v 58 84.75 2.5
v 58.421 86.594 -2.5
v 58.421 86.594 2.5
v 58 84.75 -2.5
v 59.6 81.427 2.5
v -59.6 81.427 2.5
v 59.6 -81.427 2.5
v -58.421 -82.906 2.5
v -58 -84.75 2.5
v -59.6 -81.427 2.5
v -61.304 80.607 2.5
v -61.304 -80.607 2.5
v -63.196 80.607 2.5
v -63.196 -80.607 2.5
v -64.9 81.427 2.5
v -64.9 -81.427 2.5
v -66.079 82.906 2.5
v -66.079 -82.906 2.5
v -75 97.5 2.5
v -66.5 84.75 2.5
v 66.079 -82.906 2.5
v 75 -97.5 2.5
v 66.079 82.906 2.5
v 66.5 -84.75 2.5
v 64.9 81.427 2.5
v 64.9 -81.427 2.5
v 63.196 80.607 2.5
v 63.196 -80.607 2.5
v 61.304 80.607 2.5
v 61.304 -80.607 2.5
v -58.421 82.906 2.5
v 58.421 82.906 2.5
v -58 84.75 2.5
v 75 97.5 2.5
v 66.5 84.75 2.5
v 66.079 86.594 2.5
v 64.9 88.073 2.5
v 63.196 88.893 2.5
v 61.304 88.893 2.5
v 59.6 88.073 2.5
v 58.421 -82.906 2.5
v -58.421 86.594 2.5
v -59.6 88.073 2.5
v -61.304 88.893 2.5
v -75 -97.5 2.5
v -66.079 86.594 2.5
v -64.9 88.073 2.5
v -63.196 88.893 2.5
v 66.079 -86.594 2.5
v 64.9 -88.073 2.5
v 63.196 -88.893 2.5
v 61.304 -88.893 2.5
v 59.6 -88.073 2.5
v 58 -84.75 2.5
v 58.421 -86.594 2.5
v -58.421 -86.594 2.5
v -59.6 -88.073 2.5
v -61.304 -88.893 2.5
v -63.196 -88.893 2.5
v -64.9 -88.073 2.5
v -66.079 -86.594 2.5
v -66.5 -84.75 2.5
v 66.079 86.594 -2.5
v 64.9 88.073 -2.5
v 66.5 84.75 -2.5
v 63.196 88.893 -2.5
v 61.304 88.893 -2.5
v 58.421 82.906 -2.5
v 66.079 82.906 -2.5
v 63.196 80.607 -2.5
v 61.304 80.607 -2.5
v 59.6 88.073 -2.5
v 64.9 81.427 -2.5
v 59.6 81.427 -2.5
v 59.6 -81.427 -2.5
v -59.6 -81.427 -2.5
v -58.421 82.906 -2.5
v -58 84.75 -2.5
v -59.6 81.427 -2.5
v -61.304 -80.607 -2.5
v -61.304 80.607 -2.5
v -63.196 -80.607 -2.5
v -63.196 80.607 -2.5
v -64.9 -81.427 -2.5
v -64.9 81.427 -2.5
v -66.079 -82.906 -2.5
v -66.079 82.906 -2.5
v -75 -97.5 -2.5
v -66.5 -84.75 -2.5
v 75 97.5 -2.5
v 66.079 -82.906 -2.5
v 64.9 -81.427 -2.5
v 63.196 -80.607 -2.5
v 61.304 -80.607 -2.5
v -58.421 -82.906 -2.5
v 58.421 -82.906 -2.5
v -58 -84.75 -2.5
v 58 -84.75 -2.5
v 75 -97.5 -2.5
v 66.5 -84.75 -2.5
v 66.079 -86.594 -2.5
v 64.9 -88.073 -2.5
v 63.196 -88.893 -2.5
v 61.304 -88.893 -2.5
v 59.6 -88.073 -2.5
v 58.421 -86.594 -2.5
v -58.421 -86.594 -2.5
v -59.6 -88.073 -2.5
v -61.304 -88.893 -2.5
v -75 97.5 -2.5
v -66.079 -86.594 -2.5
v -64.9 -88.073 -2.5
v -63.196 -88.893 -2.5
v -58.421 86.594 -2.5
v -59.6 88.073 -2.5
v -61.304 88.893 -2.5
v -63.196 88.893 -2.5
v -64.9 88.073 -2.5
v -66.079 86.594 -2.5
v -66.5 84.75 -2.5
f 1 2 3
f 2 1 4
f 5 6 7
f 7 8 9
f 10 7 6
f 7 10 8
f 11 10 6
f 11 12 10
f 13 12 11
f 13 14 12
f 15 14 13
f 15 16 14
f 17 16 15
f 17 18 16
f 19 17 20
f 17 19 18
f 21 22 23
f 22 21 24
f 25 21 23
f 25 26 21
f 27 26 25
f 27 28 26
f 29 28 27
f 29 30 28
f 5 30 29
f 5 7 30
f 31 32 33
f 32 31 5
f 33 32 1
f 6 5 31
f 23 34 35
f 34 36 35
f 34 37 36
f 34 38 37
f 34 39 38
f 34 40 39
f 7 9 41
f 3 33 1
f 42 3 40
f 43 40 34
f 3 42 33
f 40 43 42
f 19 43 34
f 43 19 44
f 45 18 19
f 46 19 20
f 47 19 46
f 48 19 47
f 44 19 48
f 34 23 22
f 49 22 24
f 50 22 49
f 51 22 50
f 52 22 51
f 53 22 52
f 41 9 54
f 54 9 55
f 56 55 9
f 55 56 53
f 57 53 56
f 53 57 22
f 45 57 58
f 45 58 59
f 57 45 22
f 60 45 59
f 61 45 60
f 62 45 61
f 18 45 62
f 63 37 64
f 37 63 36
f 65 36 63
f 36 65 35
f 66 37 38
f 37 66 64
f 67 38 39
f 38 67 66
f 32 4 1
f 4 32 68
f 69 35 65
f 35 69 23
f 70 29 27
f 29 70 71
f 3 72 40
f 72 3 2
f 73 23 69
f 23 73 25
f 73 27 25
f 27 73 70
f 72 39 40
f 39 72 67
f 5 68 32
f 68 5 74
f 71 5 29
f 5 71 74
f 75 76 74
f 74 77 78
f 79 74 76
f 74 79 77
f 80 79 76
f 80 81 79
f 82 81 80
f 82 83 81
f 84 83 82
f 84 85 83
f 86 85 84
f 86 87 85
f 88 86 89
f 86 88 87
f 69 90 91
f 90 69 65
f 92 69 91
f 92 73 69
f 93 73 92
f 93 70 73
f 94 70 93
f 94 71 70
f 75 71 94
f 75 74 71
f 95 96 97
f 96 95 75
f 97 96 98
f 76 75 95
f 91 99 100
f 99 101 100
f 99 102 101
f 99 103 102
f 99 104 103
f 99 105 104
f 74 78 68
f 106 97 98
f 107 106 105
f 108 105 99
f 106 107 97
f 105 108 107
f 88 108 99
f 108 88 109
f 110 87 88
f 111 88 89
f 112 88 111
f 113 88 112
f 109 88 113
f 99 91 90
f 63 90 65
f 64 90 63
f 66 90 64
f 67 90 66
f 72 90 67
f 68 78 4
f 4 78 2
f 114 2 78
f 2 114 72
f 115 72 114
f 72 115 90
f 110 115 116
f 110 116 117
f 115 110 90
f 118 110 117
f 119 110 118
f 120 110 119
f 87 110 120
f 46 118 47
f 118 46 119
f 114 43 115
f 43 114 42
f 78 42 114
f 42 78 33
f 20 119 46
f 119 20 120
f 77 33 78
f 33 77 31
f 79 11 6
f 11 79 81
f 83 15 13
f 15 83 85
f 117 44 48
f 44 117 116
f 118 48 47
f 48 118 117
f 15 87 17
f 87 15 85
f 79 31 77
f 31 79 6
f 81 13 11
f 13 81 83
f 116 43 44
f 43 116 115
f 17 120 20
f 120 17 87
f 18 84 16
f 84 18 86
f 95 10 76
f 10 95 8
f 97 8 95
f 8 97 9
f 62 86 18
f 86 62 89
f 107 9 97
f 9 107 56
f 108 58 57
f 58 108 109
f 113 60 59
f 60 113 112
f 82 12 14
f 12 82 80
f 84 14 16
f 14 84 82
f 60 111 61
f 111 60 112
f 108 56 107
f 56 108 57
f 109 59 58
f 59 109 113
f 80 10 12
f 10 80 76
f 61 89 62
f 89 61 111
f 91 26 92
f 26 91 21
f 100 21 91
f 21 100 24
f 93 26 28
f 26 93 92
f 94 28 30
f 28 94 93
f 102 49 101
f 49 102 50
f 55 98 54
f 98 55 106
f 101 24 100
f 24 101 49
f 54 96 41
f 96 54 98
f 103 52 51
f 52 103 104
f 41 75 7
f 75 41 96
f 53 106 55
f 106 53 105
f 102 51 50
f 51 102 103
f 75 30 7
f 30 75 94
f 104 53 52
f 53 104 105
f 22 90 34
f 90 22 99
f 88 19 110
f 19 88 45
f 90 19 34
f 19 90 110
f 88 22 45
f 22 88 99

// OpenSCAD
// Generated by SolidPython 1.1.3 on 2023-10-16 11:53:18


difference() {
	cube(center = true, size = [150, 195.0000000000, 5]);
	union() {
		translate(v = [62.2500000000, 84.7500000000]) {
			cylinder(center = true, h = 5, r = 4.2500000000);
		}
		translate(v = [-62.2500000000, 84.7500000000]) {
			cylinder(center = true, h = 5, r = 4.2500000000);
		}
		translate(v = [-62.2500000000, -84.7500000000]) {
			cylinder(center = true, h = 5, r = 4.2500000000);
		}
		translate(v = [62.2500000000, -84.7500000000]) {
			cylinder(center = true, h = 5, r = 4.2500000000);
		}
	}
}
/***********************************************
*********      SolidPython code:      **********
************************************************
 
import solid
import numbers
import pudb
from solid.utils import *
import viewscad
import subprocess
import os
import os.path as osp
import math
import sys

chamfer_extrude=solid.import_scad("./chamfer_extrude.scad")
chamfer_extrude=chamfer_extrude.chamfer_extrude
r = viewscad.Renderer(width=800, height=800)

def debug(model,f_name,path="/home/ts/code/projects/mfd/designs/debug"):
    solid.scad_render_to_file(model,osp.join(path,f_name)+".scad")
#generate position list of wells using offset from center
wells_pos_from_center_4 = lambda offset: [[-offset,offset],
                                        [offset, offset],
                                        [-offset, -offset],
                                        [offset, -offset]]
#wells_pos_from_center_2 = lambda offset: [[0,offset],
#                                        [0, -offset]]
wells_pos_from_center_2 = lambda offset: [[offset,0],
                                        [-offset,0]]

def make_well(dims,shape=None,height=None,dxf=False):
    def circle_cylinder():
        if dxf or (height is None):
            well = solid.circle(r=dims, segments=64)
        else:
            well = solid.cylinder(r=dims, h=height, segments=64, center = True)
        return well
    if dims is None:
        sys.exit("radius needs to be a number")
    if isinstance(dims, numbers.Number):
        well =circle_cylinder()
    elif len(dims)==1:
        if isinstance(dims[1], numbers.Number):
            well =circle_cylinder()
        else:
            sys.exit("radius needs to be a number")
    elif len(dims)==2:
        well = solid.square(dims,center = True)
    elif len(dims)==3:
        well = solid.cube(dims, center = True)
    return well

def wells_top_bottom(center_gap,device_dims=None,shape=None,height=None, positions = None, dxf = False):
    well_shape = make_well(device_dims,shape=shape,height=height,dxf=dxf)
    wells = []
    if positions is None:
        offset = radius+radius/2.0
        positions = wells_pos_from_center_2(offset)
    if dxf or (height is None):
        height = 0
    for position in positions:
        if dxf:
            wells.append(solid.translate([position[0],position[1]])(well_shape))
        else:
            wells.append(solid.translate([position[0],position[1],height/2.0])(well_shape))
    return  union()(*wells)

#place wells in four corners 
def four_corner(radius,height=None, positions = None, dxf = False):
    #if well pos not specified set
    #to equally spaced by half radius
    if positions is None:
        offset = radius+radius/2.0
        positions = wells_pos_from_center_4(offset)
    if dxf or (height is None):
        height = 0
    #make wells at positions with specified radius and height
    wells = []
    for position in positions:
        #make circle if making dxf
        if dxf:
            well_shape = solid.circle(r=radius, segments=64)
            well_shape = solid.translate([position[0],position[1]])(well_shape)
        #if stl make cylinder
        else:
            well_shape = solid.cylinder(r=radius, h=height, segments=64, center = True)
            well_shape = solid.translate([position[0],position[1],height/2.0])(well_shape)
        wells.append(well_shape)
    return  union()(*wells)

#generate channels 
def make_channels(length,width,height=0,num_chans=1,max_chans=None,spacing=None, dxf = False,
                  rotate_channels=False):
    if dxf or (height is None):
        height = 0
    #if channel gap not defined, is equal to
    if spacing is None: spacing = width
    #calculate number of channels if fitting max num within given width
    if not max_chans is None:
        import math
        num_chans = math.floor((max_chans-spacing)/(width+spacing))
    #get total width of channel section  
    total_width = (width*num_chans)+(spacing*(num_chans-1))

    #make template channel
    #if rotate_channels: width, length = length, width
    if dxf:
        channel_t = solid.square([length,width],center = True)
    else:
        channel_t = solid.cube([length,width,height], center = True)

    #if number channels is even, offset the first channel to center its gap
    if num_chans % 2 == 0: centering = -(width/2.0+spacing/2.0)
    else: centering = 0
    #move template channel up to align bottom at z = 0 
    #and offset center if necessary
    if dxf:
        channel_t = solid.translate([0,centering])(channel_t)
    else:
        channel_t = solid.translate([0,centering,height/2.0])(channel_t)

    #if rotate_channels: length,width = width,length
    #start making the channels
    channels = []
    for i in range(num_chans):
        #if i=0 there is no translation
        #if i=1, we make the first channel adjacent to second
        direction = i

        #if i>=1, we add channels alternating left and right
        if i >= 1:
            direction = -(i/2.0)
            if i % 2 == 1: direction = (-direction)+0.5
                
        #make channel at right position and add it to channel list
        translation_coords = [0,direction*(width+spacing)]
        #if rotate_channels: translation_coords = [direction*(width+spacing),0]
        if dxf:
            channel = solid.translate(translation_coords)(channel_t)
        else:
            channel = solid.translate([*translation_coords,0])(channel_t)
        channels.append(channel)
    
    #group all channels as one object
    channels = union()(*channels)
    #compute the x,y,z dimensions in order to pass as arguments 
    #for construction of other parts of device (such as the chambers)
    measurements = {'x':(length/2.0,-length/2.0),
                    'y':(total_width/2.0,-total_width/2.0)}
    if not dxf:
        measurements['z'] = (height,0)
    if rotate_channels:
        channels = solid.rotate(90)(channels)
        measurements['x'],measurements['y']=measurements['y'],measurements['x']
    return channels,measurements

def make_chambers(msrs,height=None,extra=0,len_until=None,width=None, dxf = False):
    #computes x,y,z length
    total = lambda x : abs(x[0]) + abs(x[1])
    
    #if specific height if specified
    #otherwise use same height as channels
    if dxf:
        pass
    elif not height is None:
        msrs['z'] = (height,0)
    else:
        msrs['z'] = (0,0)
        
    #make copy of measurements from channels to modify chamber dimensions 
    #and add length to chambers as specified
    chamber_dims = msrs.copy()
    #calculate length of chamber to reach specified offset
    if not len_until is None:
        chamber_len = len_until-(msrs['x'][0])
    #or add specified length to channel length (if not specified, adds 0)
    else:
        chamber_len = msrs['x'][0]+extra
    #set the chamber length based 
    chamber_dims['x'] = (chamber_len/2.0,-(chamber_len/2.0))
    #compute final dimensions of chamber
    if not width is None:
        chamber_dims['y'] = (width/2.0,-width/2.0)
    chamber_dims = [total(size) for size in chamber_dims.values()]
        
    #calculate chamber translation offset to place adjacent to channels
    chamber_trslt = msrs['x'][0]+(chamber_len/2.0)
    #compute chamber translation coordinates to align with channels
    #x = 1 moves chamber above channels
    #x = -1 moves chamber below channels
    if dxf:
        trslt = lambda x : [x*(chamber_trslt),0]
    else:
        trslt = lambda x : [x*(chamber_trslt),0,msrs['z'][0]/2.0]
    
    #function to make chamber at top or at bottom 
    if dxf:
        move = lambda x : solid.translate(trslt(x))(solid.square(chamber_dims, center = True) )
    else:
        move = lambda x : solid.translate(trslt(x))(solid.cube(chamber_dims,center = True))
    #make top and bottom chambers and return them as grouped
    top = move(1)
    bottom = move(-1)
    #chambers=solid.rotate(90)(solid.union()(top,bottom))
    chambers=(solid.union()(top,bottom))

    return chambers

#create alignment features 
def alignment_features(unit,dims,grid_size, mask_size = None, alignment = "hollow", units_from_center = (2.5,2.5), corner_len=None):
    width = grid_size[0]*dims[0]
    length = grid_size[1]*dims[1]
    if mask_size is None and corner_len is None:
        corner_len = (dims[0] + dims[1]) /2 / 8
    corner = lambda thickness_div : solid.union()( solid.square([corner_len,corner_len/thickness_div],center=False), solid.square([corner_len/thickness_div,corner_len],center=False) )
    
    def make_full(thickness_div):
        thickness = corner_len/thickness_div
        tr = solid.translate([0, 0, 0 ])(solid.rotate(180)(corner(thickness_div)))
        tr = solid.translate([thickness/2,thickness/2,0])(tr)
        bl = solid.translate([0, 0, 0 ])(solid.rotate(0)(corner(thickness_div)))
        bl = solid.translate([-thickness/2,-thickness/2,0])(bl)
        return solid.union()(tr,bl)
    
    def make_hollow(thickness_div):
        thickness = corner_len/(thickness_div/2)
        inner = make_full(thickness_div)
        outer = make_full(thickness_div/2)
        hollow = outer - inner 
        return hollow
    
    center = (width /2 , length/2)
    mask_pos = lambda x,y : (center[0] + x*(float(units_from_center[0])*dims[0]), center[1] + y*(float(units_from_center[1])*dims[1]))
    positions = []
    positions.append(mask_pos(1,0))
    positions.append(mask_pos(0,1))
    positions.append(mask_pos(-1,0))
    positions.append(mask_pos(0,-1))
    make_mask = lambda mtype : make_hollow(8) if mtype == "hollow" else make_full(8)
    masks = [ solid.translate([*position,0])(make_mask(alignment)) for position in positions]
    
    solid.scad_render_to_file(solid.union()(*masks),"./designs/open_chamber/masks.scad")
    #return unit - solid.union()(*masks)
    return solid.union()(*masks,unit)

def create_outline(thickness, array, dims, grid_size,):
    width = grid_size[0]*dims[0] + thickness *2
    length = grid_size[1]*dims[1] + thickness *2
    outer = solid.translate([-thickness, -thickness,0])(solid.square([width, length]))
    return outer-array

def create_wall(wall_thickness, outline_thickness, dims, grid_size, wall_height = 2000, dxf = False):
    inner_width = grid_size[0]*dims[0] + outline_thickness *2
    inner_length = grid_size[1]*dims[1] + outline_thickness *2
    outer_width = inner_width + wall_thickness * 2
    outer_length = inner_length + wall_thickness * 2
    outer_pos_x = -outline_thickness-wall_thickness
    outer_pos_y = -outline_thickness-wall_thickness
    inner_pos_x = -outline_thickness
    inner_pos_y = -outline_thickness
    if dxf:
        inner_wall = solid.translate([inner_pos_x,
                                      inner_pos_y,
                                      0])(solid.square([inner_width, inner_length]))
        outer_wall = solid.translate([outer_pos_x,
                                      outer_pos_y,
                                      0])(solid.square([outer_width, outer_length]))

        return outer_wall-inner_wall
    else:
        inner_wall = solid.translate([inner_pos_x,
                                      inner_pos_y,
                                      0])(solid.cube([inner_width, inner_length,wall_height]))
        outer_wall = solid.translate([outer_pos_x,
                                      outer_pos_y,
                                      0])(solid.cube([outer_width, outer_length,wall_height]))

        return outer_wall-inner_wall, {'wall_height': wall_height,
                                       'wall_thickness': wall_thickness,
                                       'inner_width':inner_width,
                                       'inner_length': inner_length,
                                       'outer_width': outer_width,
                                       'outer_length': outer_length,
                                       'outer_pos_x' : outer_pos_x,
                                       'outer_pos_y' : outer_pos_y,
                                       'inner_pos_x' : inner_pos_x,
                                       'inner_pos_y' : inner_pos_y}

def create_thicker_wall(wall_thickness, outer_wall_offset, wall_dims, dims, grid_size, height_start = .2, height_end=2, dxf = False):
    addon_wall,thicker_wall_dims = create_wall(wall_thickness, outer_wall_offset, dims, grid_size, wall_height=height_end-height_start, dxf = False)
    addon_wall = solid.translate([0,0,height_start])(addon_wall)

    thicker_wall_dims['wall_height'] = height_end
    thicker_wall_dims['wall_thickness'] = wall_dims['wall_thickness'] + wall_thickness
    return addon_wall, thicker_wall_dims
 
def add_lock_to_wall(wall,wall_dims,y_offset = 0,cut_ratio=0.7,L_length=3, gap_ratio=0.05, axis="x",width_ratio=1/2):
    # Makes L shape
    def make_L(max_length,length_thickness,max_width,width_thickness,height,y_offset):
        length = solid.cube([max_length,length_thickness,height])
        width = solid.cube([width_thickness,max_width,height])
        width = solid.translate([max_length-(width_thickness),0,0])(width)
        L = solid.union()(width,length)
        debug(L,"L")
        if axis == "x":
            L = solid.rotate(-90)(L)
            L = solid.translate([0,max_length,0])(L)
        else:
            L = solid.rotate(-180)(L)
            L = solid.translate([max_length,max_width,0])(L)
        return solid.translate([0,0,y_offset])(L)
    
    lock_length = L_length
    lock_width = wall_dims['wall_thickness']*width_ratio
    lock_length_thickness = lock_width/2
    lock_width_thickness = lock_width/2
    L_lock = make_L(lock_length,lock_length_thickness,lock_width,lock_width_thickness, wall_dims['wall_height']-y_offset, y_offset)
    
    margin_space = lock_length - lock_length*(1-gap_ratio)
    key_length = lock_length-margin_space
    key_length_thickness = lock_length_thickness-(margin_space*2)
    key_width = lock_width-(margin_space*2)
    key_width_thickness = lock_width_thickness-(margin_space*2)
    L_key = make_L(key_length,key_length_thickness,key_width,key_width_thickness, wall_dims['wall_height']-y_offset, y_offset)
    L_key = solid.translate([margin_space,margin_space,0])(L_key)
    L = solid.union()(L_lock,L_key)
    debug(L,"L")
    
    #Make cube to be used as negative to split frame in a half
    #Can choose if making left or right negative, specify ratio of split
    def make_negative(right,cut_ratio):
        if axis == "x":
            if right:
                length = wall_dims['outer_length']*(1-cut_ratio)
                pos_x = wall_dims['outer_pos_x']+(wall_dims['outer_length']*cut_ratio)
            else:
                length = wall_dims['outer_length']*(cut_ratio)
                pos_x = wall_dims['outer_pos_x'] 
            negative = solid.cube([wall_dims['outer_width'],length, wall_dims['wall_height']])
            negative = solid.translate([wall_dims['outer_pos_y'],pos_x,0])(negative)
        else:
            if right:
                length = wall_dims['outer_width']*(1-cut_ratio)
                pos_x = wall_dims['outer_pos_y']+(wall_dims['outer_width']*cut_ratio)
            else:
                length = wall_dims['outer_width']*(cut_ratio)
                pos_x = wall_dims['outer_pos_y'] 
            negative = solid.cube([length,wall_dims['outer_length'], wall_dims['wall_height']])
            negative = solid.translate([pos_x,wall_dims['outer_pos_x'],0])(negative)
        return negative, pos_x, length 
                      
    #Make negatives
    negative_right, right_half_pos_x, right_half_length = make_negative(True,cut_ratio)
    negative_left, left_half_pos_x, right_half_length = make_negative(False,cut_ratio)
    #Make halves
    left_half = solid.difference()(wall,negative_right)
    right_half = solid.difference()(wall,negative_left)
    def place_L(L, L_length,L_width):
        #Place L on top wall       
        offset_to_center = (wall_dims['wall_thickness']-L_width)/2
        if axis == "x":
            y_pos_top = (wall_dims['outer_pos_y'] +
                    wall_dims['outer_width'] - 
                    L_width - offset_to_center)
            top_L = solid.translate([y_pos_top,
                                     right_half_pos_x-(L_length),
                                     0])(L)
            #Place L on bottom wall       
            y_pos_bottom = wall_dims['outer_pos_y']+offset_to_center
            bottom_L = solid.translate([y_pos_bottom,
                                        right_half_pos_x-L_length,
                                        0])(L)
        else:
            y_pos_top = (wall_dims['outer_pos_x'] +
                    wall_dims['outer_length'] -
                    (L_width+offset_to_center))
            top_L = solid.translate([right_half_pos_x-L_length,
                                     y_pos_top,
                                     0])(L)
            #Place L on bottom wall       
            y_pos_bottom = wall_dims['outer_pos_y']+offset_to_center
            bottom_L = solid.translate([right_half_pos_x-L_length,
                                        y_pos_bottom,
                                        0])(L)
        return bottom_L, top_L
    #Make complimentary L pieces through union and differences
    #Make Lock
    bottom_L_lock, top_L_lock = place_L(L_lock,L_length,lock_width)
    left_half = solid.difference()(left_half,bottom_L_lock)
    left_half = solid.difference()(left_half,top_L_lock)
    #Make Key
    bottom_L_key, top_L_key = place_L(L_key,L_length,lock_width)
    right_half = solid.union()(right_half,bottom_L_key)
    right_half = solid.union()(right_half,top_L_key)
    return left_half, right_half


#build a row x col grid of containment units
def make_unit_array(unit,dims,grid_size, dxf = False, alignment = None, mask_size = None,
                    units_from_center = None,alignment_offset=None, alignment_mark_size=1):
    units = []
    for col in range(grid_size[1]):
        for row in range(grid_size[0]):
            if dxf:
                units.append(solid.translate([row*dims[0],col*dims[1]])(unit))
            else:
                units.append(solid.translate([row*dims[0],col*dims[1],dims[2]/2.0])(unit))
    array = solid.union()(*units)
    if (not alignment is None) and dxf:
        if not alignment_offset is None:
            array = solid.translate([alignment_offset[0],alignment_offset[1]])(array)
        array = alignment_features(array,dims, grid_size, alignment = alignment, mask_size = None, units_from_center = units_from_center,corner_len=alignment_mark_size)
        if not alignment_offset is None:
            array = solid.translate([-alignment_offset[0],-alignment_offset[1]])(array)
    return array


def make_taylor(wells_pos = wells_pos_from_center_4(2.25), well_rad = 1.5 ,
                well_height = 2, chan_w = 0.01, chan_l = 1, chan_h = 0.010 ,
                chan_gap = 0.040, max_chans = None,num_chans=100, chamber_height  = 0.100,
                columns = 1, rows = 1, chamber_len_until=2.25, add_channels = True, add_wells = True, 
                add_chambers = True, save_path = "./", alignment = None, units_from_center = 2,
                mask_size = None, render_stl = False, outline_thickness = 0.050, dxf = True,
                wall_height = 15, wall_thickness = 0.95, casing_x=9, casing_y=9, casing_z=0,rotate_units=0):

    dims = [casing_x, casing_y, casing_z]
    wells = four_corner(well_rad,well_height, dxf = dxf, positions = wells_pos)
    debug(wells,"wells")
    channels, msrs = make_channels(chan_l,chan_w,chan_h,dxf=dxf, spacing = chan_gap, max_chans=max_chans,num_chans=num_chans)
    debug(channels,"channels")
    chambers = make_chambers(msrs,dxf = dxf, height=chamber_height,len_until=chamber_len_until)
    debug(chambers,"chambers")

    #add together and render
    device_parts = []
    if add_channels:
        device_parts.append(channels)
    if add_wells:
        device_parts.append(wells)
    if add_chambers:
        device_parts.append(chambers)
    device=union()(*device_parts)
    device = rotate(rotate_units)(device)

    device=solid.translate([dims[0]/2.0,dims[1]/2.0,0])(device)
    channels = rotate(rotate_units)(channels)
    channels=solid.translate([dims[0]/2,dims[1]/2,0])(channels)
    chambers_wells = union()(wells,chambers)
    chambers_wells = rotate(rotate_units)(chambers_wells)
    chambers_wells=solid.translate([dims[0]/2,dims[1]/2,0])(chambers_wells)

    file_name = str(rows)+'x'+str(columns)+'_units_'
    grid_size = [rows,columns]

    if alignment:
        alignment="full"
    device = make_unit_array(device,dims,grid_size, dxf=dxf, alignment = alignment,
                                 units_from_center = units_from_center)
    channels = make_unit_array(channels,dims,grid_size, dxf=dxf, alignment = alignment,
                                 units_from_center = units_from_center)
    if alignment=="full":
        alignment="hollow"

    chambers_wells = make_unit_array(chambers_wells,dims,grid_size, dxf=dxf, alignment = alignment,
                                 units_from_center =units_from_center)

    def save_model(model,prefix):
        model_fname = os.path.abspath(save_path+prefix+"_"+file_name+".scad")
        solid.scad_render_to_file(model,model_fname)
        return model_fname

    wells_fname = save_model(wells,"wells")
    channels_fname = save_model(channels,"channels")
    device_fname = save_model(device,"device")
    chambers_wells_fname = save_model(chambers_wells,"chambers_wells")
    return (chambers_wells,chambers_wells_fname), (channels,channels_fname), (device,device_fname)

def make_device(design='open',rows=8,columns=6,wells_pos = 4.5,well_offset=3.2, well_rad=3.2,well_height=0.1,
                chan_l=1,chan_w=0.01,chan_h=0.01,chan_gap=0.015,num_chans=101,dxf=True,save_path="./designs/open_chamber/",
                casing_x=9.0,casing_y=18.0,casing_z=0,rotate_units=90,units_from_center=(3,1),chamber_len_until=4.5,
                chamber_width=None,alignment=True, add_wells=True, add_channels=True,add_chambers=True):

    dims = [casing_x, casing_y, casing_z]
    if design == "open":
        wells_pos=wells_pos_from_center_2(wells_pos)
        wells = wells_top_bottom(well_offset*2,device_dims=well_rad,height=well_height, dxf = dxf, positions = wells_pos)
    elif design == "closed":
        wells_pos=wells_pos_from_center_4(wells_pos)
        debug(wells,"wells")
        wells = four_corner(well_offset,well_heightdevice_dims=well_rad, dxf = dxf, positions = wells_pos)
    else:
        print(design+" is not a valid design.\n Choose valid design: 'open' or 'closed'")
        exit()
    wells = rotate(rotate_units)(wells)
    wells=solid.translate([dims[0]/2,dims[1]/2,0])(wells)
    debug(wells,"wells")

    channels, msrs = make_channels(chan_l,chan_w,chan_h,dxf=dxf, spacing = chan_gap, num_chans=num_chans,rotate_channels=False)
    channels = rotate(rotate_units)(channels)
    channels=solid.translate([dims[0]/2,dims[1]/2,0])(channels)

    chambers=make_chambers(msrs,height=None,extra=0,len_until=chamber_len_until, width=chamber_width,dxf = dxf)
    chambers = rotate(rotate_units)(chambers)
    chambers=solid.translate([dims[0]/2,dims[1]/2,0])(chambers)

    device_parts = []
    if add_channels:
        device_parts.append(channels)
    if add_wells:
        device_parts.append(wells)
    if add_chambers:
        device_parts.append(chambers)
    device = union()(*device_parts)
    #device = rotate(rotate_units)(device)
    #device=solid.translate([dims[0]/2.0,dims[1]/2.0,0])(device)

    chambers_wells = []
    if add_chambers:
        chambers_wells.append(chambers)
    if add_wells:
        chambers_wells.append(wells)
    chambers_wells = union()(*chambers_wells)
    #chambers_wells = union()(wells,chambers)
    #chambers_wells = rotate(rotate_units)(chambers_wells)
    #chambers_wells=solid.translate([dims[0]/2,dims[1]/2,0])(chambers_wells)

    file_name = str(rows)+'x'+str(columns)+'_units_'

    grid_size = [rows,columns]
    if alignment:
        alignment="full"
    device = make_unit_array(device,dims,grid_size, dxf=dxf, alignment = alignment,
                                 units_from_center = units_from_center)
    channels = make_unit_array(channels,dims,grid_size, dxf=dxf, alignment = alignment,
                                 units_from_center = units_from_center)
    if alignment=="full":
        alignment="hollow"

    chambers_wells = make_unit_array(chambers_wells,dims,grid_size, dxf=dxf, alignment = alignment,
                                 units_from_center =units_from_center)

    def save_model(model,prefix):
        model_fname = os.path.abspath(save_path+prefix+"_"+file_name+".scad")
        solid.scad_render_to_file(model,model_fname)
        return model_fname

    wells_fname = save_model(wells,"wells")
    channels_fname = save_model(channels,"channels")
    device_fname = save_model(device,"device")
    chambers_wells_fname = save_model(chambers_wells,"chambers_wells")
    return (chambers_wells,chambers_wells_fname), (channels,channels_fname), (device,device_fname)


def make_open_chamber(rows=8,columns=6,wells_pos = wells_pos_from_center_2(4.5), well_rad=3.2,well_height=0.1,
                      chan_l=1,chan_w=0.01,chan_h=0.01,chan_gap=0.015,num_chans=101,dxf=True,save_path="./designs/open_chamber/",
                      casing_x=9.0,casing_y=18.0,casing_z=0,rotate_units=90,units_from_center=(3,1),chamber_len_until=4.5,
                      chamber_width=None,alignment=True, add_wells=True, add_channels=True,add_chambers=True):

    dims = [casing_x, casing_y, casing_z]
    wells = wells_top_bottom(well_rad,height=well_height, dxf = dxf, positions = wells_pos)
    channels, msrs = make_channels(chan_l,chan_w,chan_h,dxf=dxf, spacing = chan_gap, num_chans=num_chans,rotate_channels=False)
    chambers=make_chambers(msrs,height=None,extra=0,len_until=chamber_len_until, width=chamber_width,dxf = dxf)
    debug(chambers,"chambers")
    device_parts = []
    if add_channels:
        device_parts.append(channels)
    if add_wells:
        device_parts.append(wells)
    if add_chambers:
        device_parts.append(chambers)
    device = union()(*device_parts)
    device = rotate(rotate_units)(device)
    device=solid.translate([dims[0]/2.0,dims[1]/2.0,0])(device)
    channels = rotate(rotate_units)(channels)
    channels=solid.translate([dims[0]/2,dims[1]/2,0])(channels)
    chambers_wells = union()(wells,chambers)
    chambers_wells = rotate(rotate_units)(chambers_wells)
    chambers_wells=solid.translate([dims[0]/2,dims[1]/2,0])(chambers_wells)

    file_name = str(rows)+'x'+str(columns)+'_units_'

    grid_size = [rows,columns]
    if alignment:
        alignment="full"
    device = make_unit_array(device,dims,grid_size, dxf=dxf, alignment = alignment,
                                 units_from_center = units_from_center)
    channels = make_unit_array(channels,dims,grid_size, dxf=dxf, alignment = alignment,
                                 units_from_center = units_from_center)
    if alignment=="full":
        alignment="hollow"

    chambers_wells = make_unit_array(chambers_wells,dims,grid_size, dxf=dxf, alignment = alignment,
                                 units_from_center =units_from_center)

    def save_model(model,prefix):
        model_fname = os.path.abspath(save_path+prefix+"_"+file_name+".scad")
        solid.scad_render_to_file(model,model_fname)
        return model_fname

    wells_fname = save_model(wells,"wells")
    channels_fname = save_model(channels,"channels")
    device_fname = save_model(device,"device")
    chambers_wells_fname = save_model(chambers_wells,"chambers_wells")
    return (chambers_wells,chambers_wells_fname), (channels,channels_fname), (device,device_fname)

def to_dxf(scad_path):
    dxf_path = scad_path.replace(".scad",".dxf")
    subprocess.call(["openscad", "-o", dxf_path, scad_path])
    import ezdxf
    temp_dxf = ezdxf.readfile(dxf_path)
    temp_dxf.saveas(dxf_path)

#def make_walls(diameter,thickness,grid_size,dims,height=20,segments=256,make_inner=True):
#    wafer_wall_out = solid.cylinder(r=diameter/2,h=height, segments=segments)
#    wafer_wall_in = solid.cylinder(r=(diameter/2-thickness),h=height, segments=segments)
#    wafer_wall = solid.difference()(wafer_wall_out,wafer_wall_in)
#    wafer_wall = solid.translate([grid_size[1]*dims[1]/2.0,grid_size[0]*dims[0]/2.0])(wafer_wall)
#
#    vertical_wall_length = grid_size[1]*dims[1]
#    horizontal_wall_length = grid_size[0]*dims[0]
#    vertical_wall = solid.cube([vertical_wall_length,thickness,height],center = True)
#    vertical_wall = solid.translate([vertical_wall_length/2,0,height/2])(vertical_wall)
#    horizontal_wall = solid.cube([thickness,horizontal_wall_length,height],center = True)
#    horizontal_wall = solid.translate([0,vertical_wall_length/2,height/2])(horizontal_wall)
#    walls = []
#    walls.append(horizontal_wall)
#    walls.append(vertical_wall)
#    for col in range(grid_size[1]):
#        if col == grid_size[1]-1: 
#            walls.append(solid.translate([0,(col+1)*dims[1]])(vertical_wall))
#        elif col > 0 and col < grid_size[1]-1 and make_inner==True:
#            walls.append(solid.translate([0,(col+1)*dims[1]])(vertical_wall))
#    for row in range(grid_size[0]):
#        if row == grid_size[0]-1: 
#            walls.append(solid.translate([(row+1)*dims[0],0])(horizontal_wall))
#        elif row > 0 and row < grid_size[0]-1 and make_inner==True:
#            walls.append(solid.translate([(row+1)*dims[0],0])(horizontal_wall))
#    walls = union()(*walls)
#    wafer_walls = union()(walls,wafer_wall)
#    return walls,wafer_wall,wafer_walls

def make_walls(diameter,thickness,grid_size,dims,height=20,segments=256,make_inner=True,padx=0,pady=0):
    wafer_wall_out = solid.cylinder(r=diameter/2,h=height, segments=segments)
    wafer_wall_in = solid.cylinder(r=(diameter/2-thickness),h=height, segments=segments)
    wafer_wall = solid.difference()(wafer_wall_out,wafer_wall_in)
    wafer_wall = solid.translate([grid_size[1]*dims[1]/2.0,grid_size[0]*dims[0]/2.0])(wafer_wall)

    vertical_wall_length = grid_size[0]*dims[0]+padx
    horizontal_wall_length = grid_size[1]*dims[1]+pady
    vertical_wall = solid.cube([vertical_wall_length,thickness,height],center = True)
    vertical_wall = solid.translate([vertical_wall_length/2-pady/2,-padx/2,height/2])(vertical_wall)
    horizontal_wall = solid.cube([thickness,horizontal_wall_length,height],center = True)
    horizontal_wall = solid.translate([-pady/2,horizontal_wall_length/2-padx/2,height/2])(horizontal_wall)
    walls = []
    walls.append(horizontal_wall)
    walls.append(vertical_wall)
    for col in range(grid_size[1]):
        if col == grid_size[1]-1: 
            walls.append(solid.translate([0,(col+1)*dims[1]+pady])(vertical_wall))
        elif col > 0 and col < grid_size[1]-1 and make_inner==True:
            walls.append(solid.translate([0,(col+1)*dims[1]])(vertical_wall))
    for row in range(grid_size[0]):
        if row == grid_size[0]-1: 
            walls.append(solid.translate([(row+1)*dims[0]+padx,0])(horizontal_wall))
        elif row > 0 and row < grid_size[0]-1 and make_inner==True:
            walls.append(solid.translate([(row+1)*dims[0],0])(horizontal_wall))
    walls = union()(*walls)
    wafer_walls = union()(walls,wafer_wall)
    return walls,wafer_wall,wafer_walls

def save_model(model,base_path,base_name,dxf=True):
    if not os.path.exists(base_path):
        os.makedirs(base_path)
    dxf_path=osp.join(base_path,base_name+".scad")
    solid.scad_render_to_file(model,osp.join(dxf_path))
    if dxf:
        to_dxf(dxf_path)

def make_wafer(diameter,flat_len,thickness):
    wafer = solid.cylinder(r1=diameter/2,r2=diameter/2,h=thickness,segments=512,)()
    x_start_flat=(flat_len/2)
    y_start_flat = math.sqrt(((diameter/2)**2) - (x_start_flat**2) )
    height_delete_flat=diameter/2-y_start_flat
    flat_delete = solid.cube([flat_len,height_delete_flat,thickness],center=False)()
    flat_delete = solid.translate([-flat_len/2,y_start_flat,0])(flat_delete)
    wafer = solid.difference()(wafer,flat_delete)
    wafer = solid.rotate(90)(wafer)
    return wafer

def add_wafer_to_mask(wafer_size,flat_len,mask,grid_size,dims,wafer_line_thickness=0.1,outer_mask_thickness=5,alignment_offset=None):
    def make_wafer_mask(wafer_size,flat_len):
        wafer_mask = make_wafer(wafer_size,flat_len,1)
        wafer_mask = solid.projection()(wafer_mask)
        wafer_mask = solid.translate([grid_size[0]*dims[0]/2.0,grid_size[1]*dims[1]/2.0])(wafer_mask)
        if not alignment_offset is None:
            wafer_mask = solid.translate([-alignment_offset[0],-alignment_offset[1]])(wafer_mask)
        return wafer_mask

    inner_wafer_line_mask = make_wafer_mask(wafer_size-wafer_line_thickness/2,flat_len)
    outer_wafer_line_mask = make_wafer_mask(wafer_size+wafer_line_thickness/2,flat_len)
    outer_wafer_mask = make_wafer_mask(wafer_size+outer_mask_thickness,flat_len)
    outer_wafer_mask = solid.difference()(outer_wafer_mask,outer_wafer_line_mask)
    wafer_mask = solid.union()(outer_wafer_mask,inner_wafer_line_mask)

    return solid.difference()(wafer_mask,mask)

def make_posts(post_shape,post_height):
    posts = solid.linear_extrude(height=post_height)(post_shape)
    return posts

def make_wafer_empty(diameter,flat_len,thickness,margin,notch_len=20,notch_height=5,oversize=1.01):
    diameter*=oversize
    flat_len*=oversize
    wafer = make_wafer(diameter,flat_len,thickness)
    holder = solid.cylinder(r1=diameter/2+margin,r2=diameter/2+margin,h=thickness,segments=512)()
    holder = solid.difference()(holder,wafer)

    x_start_flat=(flat_len/2)
    y_start_flat = math.sqrt(((diameter/2)**2) - (x_start_flat**2) )
    height_delete_flat=diameter/2-y_start_flat
    notch = solid.cube([notch_len,notch_height,thickness],center=False)()
    notch = solid.translate([-notch_len/2,y_start_flat,0])(notch)
    notch = solid.rotate(90)(notch)
    return solid.difference()(holder,notch)

def wafer_print_calibration(diameter,thickness,height,z_offset):
    circles = []
    radii = []
    radii.append(diameter/2.0*0.8)
    radii.append(diameter/2.0*0.6)
    radii.append(diameter/2.0*0.4)
    radii.append(diameter/2.0*0.2)
    for radius in radii:
        inner = solid.cylinder(r1=radius-(thickness/2.0),r2=radius-(thickness/2.0),h=thickness,segments=512,)()
        outer = solid.cylinder(r1=radius+(thickness/2.0),r2=radius+(thickness/2.0),h=thickness,segments=512,)()
        diff = solid.difference()(outer,inner)
        circles.append(diff)
    circles = solid.union()(*circles)
    circles = solid.translate([0,0,z_offset])(circles)
    return circles

def make_rack(wells,dims,grid_size,alignment_offset,rack_x,rack_y,rack_thickness,bolt_width,add_bolts=True):

    #get X and Y dimensions of gride of pipette tips
    X_len = dims[0]*grid_size[0]
    Y_len = dims[1]*grid_size[1]
    #make rack
    rack = solid.cube([rack_x,rack_y,rack_thickness],center=True)

    if add_bolts:
    #add bolt holes
        bolt_hole=solid.cylinder(r=bolt_width/2,h=rack_thickness,center=True)()
        bolt_holes = []
        bolt_holes.append(solid.translate([rack_x/2-1.5*bolt_width,rack_y/2-1.5*bolt_width])(bolt_hole))
        bolt_holes.append(solid.translate([-rack_x/2+1.5*bolt_width,rack_y/2-1.5*bolt_width])(bolt_hole))
        bolt_holes.append(solid.translate([-rack_x/2+1.5*bolt_width,-rack_y/2+1.5*bolt_width])(bolt_hole))
        bolt_holes.append(solid.translate([rack_x/2-1.5*bolt_width,-rack_y/2+1.5*bolt_width])(bolt_hole))
        bolt_holes = solid.union()(*bolt_holes)
        rack=solid.difference()(rack,bolt_holes)
    rack_support = rack

    #center rack with pipette holes
    rack = solid.translate([0,0,rack_thickness/2])(rack)
    rack = solid.translate([X_len/2,Y_len/2])(rack)
    rack = solid.translate([-alignment_offset[0],-alignment_offset[1]])(rack)
    wells = solid.linear_extrude(height=rack_thickness)(wells)
    rack = solid.difference()(rack,wells)
    return rack, rack_support

def make_pillar(wells,dims,grid_size,alignment_offset,rack_x,rack_y,pillar_height,rack_thickness,bolt_width,add_bolts=True,taper_angle=1,bolt_position_corner=1.5):

    #get X and Y dimensions of gride of pipette tips
    X_len = dims[0]*grid_size[0]
    Y_len = dims[1]*grid_size[1]
    #make rack
    rack = solid.cube([rack_x,rack_y,rack_thickness],center=True)
    
    if add_bolts:
    #add bolt holes
        bolt_hole=solid.cylinder(r=bolt_width/2,h=rack_thickness,center=True)()
        bolt_holes = []
        bolt_holes.append(solid.translate([rack_x/2-bolt_position_corner*bolt_width,rack_y/2-bolt_position_corner*bolt_width])(bolt_hole))
        bolt_holes.append(solid.translate([-rack_x/2+bolt_position_corner*bolt_width,rack_y/2-bolt_position_corner*bolt_width])(bolt_hole))
        bolt_holes.append(solid.translate([-rack_x/2+bolt_position_corner*bolt_width,-rack_y/2+bolt_position_corner*bolt_width])(bolt_hole))
        bolt_holes.append(solid.translate([rack_x/2-bolt_position_corner*bolt_width,-rack_y/2+bolt_position_corner*bolt_width])(bolt_hole))
        bolt_holes = solid.union()(*bolt_holes)
        rack=solid.difference()(rack,bolt_holes)
    rack_support = rack

    #center rack with pipette holes
    #rack = solid.translate([0,0,-rack_thickness])(rack)
    rack = solid.translate([X_len/2,Y_len/2])(rack)
    rack = solid.translate([-alignment_offset[0],-alignment_offset[1]])(rack)
    if not taper_angle == 0:
        wells=chamfer_extrude(pillar_height,taper_angle,segments=20)(wells)
    else:
        wells = solid.linear_extrude(height=pillar_height)(wells)
    rack = solid.union()(rack,wells)
    return rack, rack_support

def deg_taper_len(height,deg):
    if not deg == 0:
        return height*math.tan(math.radians(deg))
    else:
        return 0









 
 
************************************************/
